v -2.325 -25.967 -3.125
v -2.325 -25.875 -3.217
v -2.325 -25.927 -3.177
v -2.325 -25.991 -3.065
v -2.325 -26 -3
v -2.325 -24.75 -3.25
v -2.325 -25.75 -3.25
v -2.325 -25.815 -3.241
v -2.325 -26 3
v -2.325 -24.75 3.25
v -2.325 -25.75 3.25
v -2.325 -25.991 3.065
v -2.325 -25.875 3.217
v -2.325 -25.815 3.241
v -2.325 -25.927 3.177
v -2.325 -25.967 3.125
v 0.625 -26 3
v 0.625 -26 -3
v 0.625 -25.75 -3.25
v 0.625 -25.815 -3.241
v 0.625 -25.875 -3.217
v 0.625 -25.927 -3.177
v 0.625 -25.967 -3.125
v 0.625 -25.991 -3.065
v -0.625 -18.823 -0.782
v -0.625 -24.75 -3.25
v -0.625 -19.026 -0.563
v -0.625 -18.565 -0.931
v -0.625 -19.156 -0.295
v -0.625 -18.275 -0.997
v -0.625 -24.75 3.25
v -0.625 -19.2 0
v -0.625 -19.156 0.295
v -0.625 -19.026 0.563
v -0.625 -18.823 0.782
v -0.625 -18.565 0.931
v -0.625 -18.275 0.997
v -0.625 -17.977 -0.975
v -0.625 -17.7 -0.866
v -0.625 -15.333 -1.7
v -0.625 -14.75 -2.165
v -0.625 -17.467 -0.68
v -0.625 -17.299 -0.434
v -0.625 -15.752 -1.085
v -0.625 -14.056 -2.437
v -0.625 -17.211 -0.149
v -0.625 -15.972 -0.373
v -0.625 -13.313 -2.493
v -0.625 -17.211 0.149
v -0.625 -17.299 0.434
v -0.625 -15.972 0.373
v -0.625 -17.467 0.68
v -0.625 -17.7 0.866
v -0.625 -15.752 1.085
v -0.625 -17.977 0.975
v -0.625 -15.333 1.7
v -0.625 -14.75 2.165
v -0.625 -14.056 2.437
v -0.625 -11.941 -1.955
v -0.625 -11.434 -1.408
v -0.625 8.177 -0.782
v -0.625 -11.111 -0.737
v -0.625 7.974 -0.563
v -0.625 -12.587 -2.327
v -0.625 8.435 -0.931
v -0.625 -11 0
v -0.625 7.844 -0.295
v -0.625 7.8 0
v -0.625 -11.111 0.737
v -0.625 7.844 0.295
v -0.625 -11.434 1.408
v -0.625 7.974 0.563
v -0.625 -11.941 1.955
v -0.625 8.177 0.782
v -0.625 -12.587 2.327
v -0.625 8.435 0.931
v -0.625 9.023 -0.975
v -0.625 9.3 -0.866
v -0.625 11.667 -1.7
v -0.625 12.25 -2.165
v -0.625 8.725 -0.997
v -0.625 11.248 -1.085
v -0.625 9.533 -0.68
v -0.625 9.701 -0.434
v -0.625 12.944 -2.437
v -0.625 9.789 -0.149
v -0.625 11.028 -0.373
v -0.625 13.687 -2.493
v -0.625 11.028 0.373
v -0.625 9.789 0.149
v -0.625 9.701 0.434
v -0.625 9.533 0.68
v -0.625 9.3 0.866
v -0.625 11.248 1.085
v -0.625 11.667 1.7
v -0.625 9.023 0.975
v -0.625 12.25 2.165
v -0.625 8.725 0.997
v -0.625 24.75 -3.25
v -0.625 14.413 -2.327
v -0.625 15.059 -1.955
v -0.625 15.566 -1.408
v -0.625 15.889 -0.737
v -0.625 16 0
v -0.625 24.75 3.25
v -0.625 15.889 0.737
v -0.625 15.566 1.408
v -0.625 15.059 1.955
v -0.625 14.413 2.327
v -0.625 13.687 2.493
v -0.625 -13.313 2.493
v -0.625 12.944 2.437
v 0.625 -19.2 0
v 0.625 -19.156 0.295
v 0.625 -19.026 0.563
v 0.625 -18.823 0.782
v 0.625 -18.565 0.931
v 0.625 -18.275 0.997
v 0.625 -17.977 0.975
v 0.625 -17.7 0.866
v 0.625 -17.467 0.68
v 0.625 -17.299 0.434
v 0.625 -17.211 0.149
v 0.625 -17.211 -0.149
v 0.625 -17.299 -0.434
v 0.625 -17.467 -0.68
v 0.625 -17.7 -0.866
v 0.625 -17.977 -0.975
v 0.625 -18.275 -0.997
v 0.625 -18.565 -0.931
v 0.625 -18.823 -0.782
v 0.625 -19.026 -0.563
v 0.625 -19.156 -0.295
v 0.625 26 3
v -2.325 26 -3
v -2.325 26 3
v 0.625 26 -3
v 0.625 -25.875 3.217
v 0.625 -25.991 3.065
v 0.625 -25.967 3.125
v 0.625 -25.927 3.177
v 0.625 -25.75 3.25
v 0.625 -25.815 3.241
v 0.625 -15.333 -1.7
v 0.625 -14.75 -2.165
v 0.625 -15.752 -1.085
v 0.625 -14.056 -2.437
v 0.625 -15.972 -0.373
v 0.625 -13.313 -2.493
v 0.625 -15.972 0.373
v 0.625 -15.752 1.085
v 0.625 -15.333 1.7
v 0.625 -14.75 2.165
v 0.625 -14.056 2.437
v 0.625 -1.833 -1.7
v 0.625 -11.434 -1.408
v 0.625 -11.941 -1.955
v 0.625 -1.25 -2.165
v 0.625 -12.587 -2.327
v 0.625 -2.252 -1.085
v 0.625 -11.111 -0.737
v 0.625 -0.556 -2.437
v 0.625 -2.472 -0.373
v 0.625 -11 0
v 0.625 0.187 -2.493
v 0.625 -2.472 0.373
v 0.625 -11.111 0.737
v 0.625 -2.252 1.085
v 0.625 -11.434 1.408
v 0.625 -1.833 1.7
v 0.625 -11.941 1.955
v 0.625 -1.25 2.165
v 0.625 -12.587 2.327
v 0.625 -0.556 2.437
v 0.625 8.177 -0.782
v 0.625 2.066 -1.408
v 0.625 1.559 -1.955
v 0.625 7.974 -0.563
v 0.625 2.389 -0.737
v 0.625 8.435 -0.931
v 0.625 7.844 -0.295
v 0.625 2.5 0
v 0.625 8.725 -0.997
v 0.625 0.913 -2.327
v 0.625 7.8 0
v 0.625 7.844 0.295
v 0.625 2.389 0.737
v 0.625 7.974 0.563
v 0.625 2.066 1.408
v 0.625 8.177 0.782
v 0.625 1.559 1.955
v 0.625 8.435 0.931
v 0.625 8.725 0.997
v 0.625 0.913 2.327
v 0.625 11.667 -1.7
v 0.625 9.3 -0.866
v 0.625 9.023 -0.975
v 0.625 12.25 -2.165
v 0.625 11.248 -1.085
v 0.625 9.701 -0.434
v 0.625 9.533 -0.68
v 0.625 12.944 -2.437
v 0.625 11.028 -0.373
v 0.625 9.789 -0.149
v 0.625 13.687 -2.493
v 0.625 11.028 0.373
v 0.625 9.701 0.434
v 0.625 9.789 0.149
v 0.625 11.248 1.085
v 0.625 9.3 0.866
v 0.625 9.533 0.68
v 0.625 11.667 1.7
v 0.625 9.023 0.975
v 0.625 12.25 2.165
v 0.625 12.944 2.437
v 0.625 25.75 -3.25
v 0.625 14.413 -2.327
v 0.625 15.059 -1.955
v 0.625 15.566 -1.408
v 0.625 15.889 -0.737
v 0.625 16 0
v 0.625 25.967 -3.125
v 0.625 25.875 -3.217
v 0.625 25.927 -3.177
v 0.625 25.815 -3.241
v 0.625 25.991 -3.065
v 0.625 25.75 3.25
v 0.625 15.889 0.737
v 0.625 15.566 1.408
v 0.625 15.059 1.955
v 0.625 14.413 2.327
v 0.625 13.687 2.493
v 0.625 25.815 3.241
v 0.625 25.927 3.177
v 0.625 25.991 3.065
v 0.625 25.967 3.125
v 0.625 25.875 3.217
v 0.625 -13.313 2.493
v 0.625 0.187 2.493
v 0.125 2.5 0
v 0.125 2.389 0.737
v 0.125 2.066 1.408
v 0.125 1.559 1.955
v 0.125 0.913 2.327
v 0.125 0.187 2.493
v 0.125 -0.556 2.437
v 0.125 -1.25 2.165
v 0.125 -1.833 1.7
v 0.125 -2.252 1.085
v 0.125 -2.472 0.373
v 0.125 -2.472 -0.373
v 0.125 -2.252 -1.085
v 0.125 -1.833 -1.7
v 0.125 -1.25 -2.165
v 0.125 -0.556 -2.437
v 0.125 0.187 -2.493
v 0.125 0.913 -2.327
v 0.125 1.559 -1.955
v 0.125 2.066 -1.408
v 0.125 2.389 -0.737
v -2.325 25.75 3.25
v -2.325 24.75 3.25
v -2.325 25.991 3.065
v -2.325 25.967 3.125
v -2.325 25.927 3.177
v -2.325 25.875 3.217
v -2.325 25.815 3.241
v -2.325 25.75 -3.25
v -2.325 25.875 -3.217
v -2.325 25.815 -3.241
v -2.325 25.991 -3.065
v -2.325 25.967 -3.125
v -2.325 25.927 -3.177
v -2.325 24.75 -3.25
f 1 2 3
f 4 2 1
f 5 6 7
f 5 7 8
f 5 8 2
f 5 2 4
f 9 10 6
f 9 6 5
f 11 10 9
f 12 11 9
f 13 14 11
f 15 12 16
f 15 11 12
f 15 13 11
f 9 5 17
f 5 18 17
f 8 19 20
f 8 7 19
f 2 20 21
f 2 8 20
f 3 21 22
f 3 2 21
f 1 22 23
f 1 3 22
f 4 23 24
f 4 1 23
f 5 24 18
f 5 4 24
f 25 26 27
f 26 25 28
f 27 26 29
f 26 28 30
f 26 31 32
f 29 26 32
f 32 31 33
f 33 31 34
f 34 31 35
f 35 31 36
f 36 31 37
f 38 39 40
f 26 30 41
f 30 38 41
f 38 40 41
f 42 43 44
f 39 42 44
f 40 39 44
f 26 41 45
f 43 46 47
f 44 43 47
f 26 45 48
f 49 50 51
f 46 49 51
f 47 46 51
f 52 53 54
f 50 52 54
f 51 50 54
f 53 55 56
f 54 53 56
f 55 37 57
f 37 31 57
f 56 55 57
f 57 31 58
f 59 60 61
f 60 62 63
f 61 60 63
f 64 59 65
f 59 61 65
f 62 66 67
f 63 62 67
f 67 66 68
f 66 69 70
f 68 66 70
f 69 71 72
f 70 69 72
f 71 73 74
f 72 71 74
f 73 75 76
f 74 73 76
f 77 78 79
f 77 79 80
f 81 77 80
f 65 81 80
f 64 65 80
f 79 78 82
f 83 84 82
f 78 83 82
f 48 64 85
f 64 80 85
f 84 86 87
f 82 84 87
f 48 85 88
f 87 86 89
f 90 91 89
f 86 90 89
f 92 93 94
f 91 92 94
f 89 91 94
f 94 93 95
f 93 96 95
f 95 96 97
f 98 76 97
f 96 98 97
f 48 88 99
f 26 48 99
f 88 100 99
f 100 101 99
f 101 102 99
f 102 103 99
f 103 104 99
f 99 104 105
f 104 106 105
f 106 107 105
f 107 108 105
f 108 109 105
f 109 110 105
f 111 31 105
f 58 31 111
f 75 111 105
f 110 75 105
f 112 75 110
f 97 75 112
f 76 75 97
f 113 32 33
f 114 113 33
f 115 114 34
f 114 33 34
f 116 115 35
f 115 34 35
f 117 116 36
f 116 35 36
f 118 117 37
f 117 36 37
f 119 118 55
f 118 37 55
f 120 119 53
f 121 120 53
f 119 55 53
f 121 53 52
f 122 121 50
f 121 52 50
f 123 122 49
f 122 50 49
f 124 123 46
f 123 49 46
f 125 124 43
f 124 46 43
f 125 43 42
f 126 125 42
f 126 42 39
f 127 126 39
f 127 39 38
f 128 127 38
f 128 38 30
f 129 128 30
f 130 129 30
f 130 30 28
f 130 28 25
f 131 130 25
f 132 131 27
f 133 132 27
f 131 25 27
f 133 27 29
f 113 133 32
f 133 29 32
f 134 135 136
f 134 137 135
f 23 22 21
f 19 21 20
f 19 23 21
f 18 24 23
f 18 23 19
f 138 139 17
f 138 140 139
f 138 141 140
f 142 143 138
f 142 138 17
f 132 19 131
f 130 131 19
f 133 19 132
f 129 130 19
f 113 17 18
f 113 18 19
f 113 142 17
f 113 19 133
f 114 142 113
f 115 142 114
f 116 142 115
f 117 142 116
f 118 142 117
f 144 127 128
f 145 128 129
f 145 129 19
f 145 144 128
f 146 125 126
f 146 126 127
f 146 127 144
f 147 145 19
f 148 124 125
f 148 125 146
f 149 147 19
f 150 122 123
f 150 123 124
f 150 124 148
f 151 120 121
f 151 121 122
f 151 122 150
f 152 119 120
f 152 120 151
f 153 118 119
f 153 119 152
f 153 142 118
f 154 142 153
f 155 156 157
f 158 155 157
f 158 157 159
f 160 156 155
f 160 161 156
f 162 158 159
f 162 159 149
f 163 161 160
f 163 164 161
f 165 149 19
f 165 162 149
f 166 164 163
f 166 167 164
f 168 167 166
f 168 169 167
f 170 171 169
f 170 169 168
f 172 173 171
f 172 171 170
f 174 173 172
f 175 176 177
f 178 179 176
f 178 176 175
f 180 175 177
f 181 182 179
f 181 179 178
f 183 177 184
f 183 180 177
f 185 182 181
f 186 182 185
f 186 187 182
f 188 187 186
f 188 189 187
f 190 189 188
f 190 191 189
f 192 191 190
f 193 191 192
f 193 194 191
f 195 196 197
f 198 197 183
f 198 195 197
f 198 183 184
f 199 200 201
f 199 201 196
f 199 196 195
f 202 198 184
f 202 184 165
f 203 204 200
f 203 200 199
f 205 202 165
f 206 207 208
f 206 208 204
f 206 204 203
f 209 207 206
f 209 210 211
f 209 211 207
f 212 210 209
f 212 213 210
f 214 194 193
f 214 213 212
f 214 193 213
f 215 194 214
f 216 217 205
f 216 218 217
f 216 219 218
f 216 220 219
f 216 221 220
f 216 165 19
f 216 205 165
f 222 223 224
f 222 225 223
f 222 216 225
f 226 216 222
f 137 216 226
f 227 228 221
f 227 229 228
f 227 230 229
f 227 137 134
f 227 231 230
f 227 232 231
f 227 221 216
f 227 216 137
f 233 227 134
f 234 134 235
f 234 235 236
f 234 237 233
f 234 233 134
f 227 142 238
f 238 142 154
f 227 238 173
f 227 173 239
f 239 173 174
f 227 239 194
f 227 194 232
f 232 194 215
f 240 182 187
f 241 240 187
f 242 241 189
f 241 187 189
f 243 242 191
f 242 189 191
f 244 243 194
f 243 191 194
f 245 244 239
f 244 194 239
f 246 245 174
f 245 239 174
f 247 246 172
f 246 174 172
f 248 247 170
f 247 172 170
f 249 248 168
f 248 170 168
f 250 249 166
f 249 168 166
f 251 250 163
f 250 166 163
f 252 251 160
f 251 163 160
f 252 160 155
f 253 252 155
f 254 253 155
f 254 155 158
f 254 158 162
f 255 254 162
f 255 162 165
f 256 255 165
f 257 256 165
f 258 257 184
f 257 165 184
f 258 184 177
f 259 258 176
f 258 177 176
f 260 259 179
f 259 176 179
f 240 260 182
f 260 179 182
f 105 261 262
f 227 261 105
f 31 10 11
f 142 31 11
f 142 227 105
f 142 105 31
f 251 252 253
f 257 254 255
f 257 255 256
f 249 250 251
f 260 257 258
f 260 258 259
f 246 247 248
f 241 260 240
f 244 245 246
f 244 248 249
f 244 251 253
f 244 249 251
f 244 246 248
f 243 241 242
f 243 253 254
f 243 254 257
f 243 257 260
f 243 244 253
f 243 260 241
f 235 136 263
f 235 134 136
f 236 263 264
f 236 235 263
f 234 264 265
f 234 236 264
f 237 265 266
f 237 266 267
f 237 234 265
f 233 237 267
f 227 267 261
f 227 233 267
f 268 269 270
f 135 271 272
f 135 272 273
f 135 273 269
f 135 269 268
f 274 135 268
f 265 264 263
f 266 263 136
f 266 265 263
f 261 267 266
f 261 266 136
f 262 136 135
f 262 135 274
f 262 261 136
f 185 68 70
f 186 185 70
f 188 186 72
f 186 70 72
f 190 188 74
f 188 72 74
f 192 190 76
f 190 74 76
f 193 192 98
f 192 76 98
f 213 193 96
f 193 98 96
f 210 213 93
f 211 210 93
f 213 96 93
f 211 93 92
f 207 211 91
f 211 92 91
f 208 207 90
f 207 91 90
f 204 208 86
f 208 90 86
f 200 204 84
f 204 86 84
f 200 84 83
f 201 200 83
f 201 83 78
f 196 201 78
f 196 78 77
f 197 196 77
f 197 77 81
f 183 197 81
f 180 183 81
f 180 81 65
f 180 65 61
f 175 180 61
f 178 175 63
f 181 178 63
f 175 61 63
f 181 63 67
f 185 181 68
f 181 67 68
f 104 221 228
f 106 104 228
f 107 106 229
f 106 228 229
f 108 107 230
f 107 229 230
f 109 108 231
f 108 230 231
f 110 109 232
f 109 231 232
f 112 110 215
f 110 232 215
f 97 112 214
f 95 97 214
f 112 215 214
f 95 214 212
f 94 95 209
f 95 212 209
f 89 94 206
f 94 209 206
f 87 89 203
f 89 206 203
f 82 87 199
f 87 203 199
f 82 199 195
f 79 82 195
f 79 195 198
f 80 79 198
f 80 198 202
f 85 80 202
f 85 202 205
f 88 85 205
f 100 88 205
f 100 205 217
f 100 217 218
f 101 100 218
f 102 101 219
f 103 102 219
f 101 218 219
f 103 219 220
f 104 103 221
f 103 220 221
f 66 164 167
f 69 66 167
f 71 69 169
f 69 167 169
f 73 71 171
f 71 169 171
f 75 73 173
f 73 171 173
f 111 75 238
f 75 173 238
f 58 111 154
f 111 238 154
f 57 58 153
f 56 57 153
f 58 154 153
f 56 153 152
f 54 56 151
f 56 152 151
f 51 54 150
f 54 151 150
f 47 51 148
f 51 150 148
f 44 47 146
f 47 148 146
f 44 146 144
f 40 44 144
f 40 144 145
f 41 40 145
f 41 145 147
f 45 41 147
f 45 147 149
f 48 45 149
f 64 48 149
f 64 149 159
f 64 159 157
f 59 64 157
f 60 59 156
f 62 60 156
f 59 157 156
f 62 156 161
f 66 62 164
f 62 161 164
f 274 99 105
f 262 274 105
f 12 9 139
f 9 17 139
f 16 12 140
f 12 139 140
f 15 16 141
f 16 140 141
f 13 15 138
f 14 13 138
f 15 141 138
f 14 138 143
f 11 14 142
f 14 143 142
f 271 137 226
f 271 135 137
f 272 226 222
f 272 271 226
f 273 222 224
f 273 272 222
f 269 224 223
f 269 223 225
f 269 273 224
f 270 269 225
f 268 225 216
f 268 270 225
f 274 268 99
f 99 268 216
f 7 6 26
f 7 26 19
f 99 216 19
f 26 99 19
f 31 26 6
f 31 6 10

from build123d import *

# Parameters (mm, degrees)
F0_W      = 52
F0_H      = 6.5
F1_DEPTH  = 0.625
F2_W      = 1.25
F2_H      = 6.5
F3_DEPTH  = 1.7
F4_R      = 0.25
F5_R      = 2.5
F6_DEPTH  = 1.25
F7_R      = 1
F8_DEPTH  = 1.25
F9_R      = 2.5
F10_DEPTH = 0.5


with BuildPart() as f1:
    # F0 (on Right) → F1 (new body, symmetric)
    with BuildSketch(Plane.YZ):
        Rectangle(F0_W, F0_H)
    extrude(amount=F1_DEPTH, both=True)

    # F2 (on face) → F3 (join)
    with BuildSketch(Plane(origin=(-0.625, 0, 0), x_dir=(0, -1, 0), z_dir=(-1, 0, 0))):
        with Locations((-25.375, 0)):
            Rectangle(F2_W, F2_H)
        with Locations((25.375, 0)):
            Rectangle(F2_W, F2_H)
    extrude(amount=F3_DEPTH)

    # F4
    f4_edges = [f1.edges().sort_by_distance(p)[0] for p in [
        (-0.85, -26, 3.25),
        (-0.85, -26, -3.25),
        (-0.85, 26, 3.25),
        (-0.85, 26, -3.25),
    ]]
    fillet(f4_edges, radius=F4_R)

    # F5 (on face) → F6 (cut, through all)
    with BuildSketch(Plane.YZ.offset(0.625)):
        with Locations((-13.5, 0)):
            Circle(F5_R)
        with Locations((13.5, 0)):
            Circle(F5_R)
    extrude(amount=-F6_DEPTH, mode=Mode.SUBTRACT)

    # F7 (on face) → F8 (cut, through all)
    with BuildSketch(Plane(origin=(-0.625, 0, 0), x_dir=(0, -1, 0), z_dir=(-1, 0, 0))):
        with Locations((-8.8, 0)):
            Circle(F7_R)
        with Locations((18.2, 0)):
            Circle(F7_R)
    extrude(amount=-F8_DEPTH, mode=Mode.SUBTRACT)

    # F9 (on face) → F10 (cut)
    with BuildSketch(Plane.YZ.offset(0.625)):
        Circle(F9_R)
    extrude(amount=-F10_DEPTH, mode=Mode.SUBTRACT)


solid = f1.part
